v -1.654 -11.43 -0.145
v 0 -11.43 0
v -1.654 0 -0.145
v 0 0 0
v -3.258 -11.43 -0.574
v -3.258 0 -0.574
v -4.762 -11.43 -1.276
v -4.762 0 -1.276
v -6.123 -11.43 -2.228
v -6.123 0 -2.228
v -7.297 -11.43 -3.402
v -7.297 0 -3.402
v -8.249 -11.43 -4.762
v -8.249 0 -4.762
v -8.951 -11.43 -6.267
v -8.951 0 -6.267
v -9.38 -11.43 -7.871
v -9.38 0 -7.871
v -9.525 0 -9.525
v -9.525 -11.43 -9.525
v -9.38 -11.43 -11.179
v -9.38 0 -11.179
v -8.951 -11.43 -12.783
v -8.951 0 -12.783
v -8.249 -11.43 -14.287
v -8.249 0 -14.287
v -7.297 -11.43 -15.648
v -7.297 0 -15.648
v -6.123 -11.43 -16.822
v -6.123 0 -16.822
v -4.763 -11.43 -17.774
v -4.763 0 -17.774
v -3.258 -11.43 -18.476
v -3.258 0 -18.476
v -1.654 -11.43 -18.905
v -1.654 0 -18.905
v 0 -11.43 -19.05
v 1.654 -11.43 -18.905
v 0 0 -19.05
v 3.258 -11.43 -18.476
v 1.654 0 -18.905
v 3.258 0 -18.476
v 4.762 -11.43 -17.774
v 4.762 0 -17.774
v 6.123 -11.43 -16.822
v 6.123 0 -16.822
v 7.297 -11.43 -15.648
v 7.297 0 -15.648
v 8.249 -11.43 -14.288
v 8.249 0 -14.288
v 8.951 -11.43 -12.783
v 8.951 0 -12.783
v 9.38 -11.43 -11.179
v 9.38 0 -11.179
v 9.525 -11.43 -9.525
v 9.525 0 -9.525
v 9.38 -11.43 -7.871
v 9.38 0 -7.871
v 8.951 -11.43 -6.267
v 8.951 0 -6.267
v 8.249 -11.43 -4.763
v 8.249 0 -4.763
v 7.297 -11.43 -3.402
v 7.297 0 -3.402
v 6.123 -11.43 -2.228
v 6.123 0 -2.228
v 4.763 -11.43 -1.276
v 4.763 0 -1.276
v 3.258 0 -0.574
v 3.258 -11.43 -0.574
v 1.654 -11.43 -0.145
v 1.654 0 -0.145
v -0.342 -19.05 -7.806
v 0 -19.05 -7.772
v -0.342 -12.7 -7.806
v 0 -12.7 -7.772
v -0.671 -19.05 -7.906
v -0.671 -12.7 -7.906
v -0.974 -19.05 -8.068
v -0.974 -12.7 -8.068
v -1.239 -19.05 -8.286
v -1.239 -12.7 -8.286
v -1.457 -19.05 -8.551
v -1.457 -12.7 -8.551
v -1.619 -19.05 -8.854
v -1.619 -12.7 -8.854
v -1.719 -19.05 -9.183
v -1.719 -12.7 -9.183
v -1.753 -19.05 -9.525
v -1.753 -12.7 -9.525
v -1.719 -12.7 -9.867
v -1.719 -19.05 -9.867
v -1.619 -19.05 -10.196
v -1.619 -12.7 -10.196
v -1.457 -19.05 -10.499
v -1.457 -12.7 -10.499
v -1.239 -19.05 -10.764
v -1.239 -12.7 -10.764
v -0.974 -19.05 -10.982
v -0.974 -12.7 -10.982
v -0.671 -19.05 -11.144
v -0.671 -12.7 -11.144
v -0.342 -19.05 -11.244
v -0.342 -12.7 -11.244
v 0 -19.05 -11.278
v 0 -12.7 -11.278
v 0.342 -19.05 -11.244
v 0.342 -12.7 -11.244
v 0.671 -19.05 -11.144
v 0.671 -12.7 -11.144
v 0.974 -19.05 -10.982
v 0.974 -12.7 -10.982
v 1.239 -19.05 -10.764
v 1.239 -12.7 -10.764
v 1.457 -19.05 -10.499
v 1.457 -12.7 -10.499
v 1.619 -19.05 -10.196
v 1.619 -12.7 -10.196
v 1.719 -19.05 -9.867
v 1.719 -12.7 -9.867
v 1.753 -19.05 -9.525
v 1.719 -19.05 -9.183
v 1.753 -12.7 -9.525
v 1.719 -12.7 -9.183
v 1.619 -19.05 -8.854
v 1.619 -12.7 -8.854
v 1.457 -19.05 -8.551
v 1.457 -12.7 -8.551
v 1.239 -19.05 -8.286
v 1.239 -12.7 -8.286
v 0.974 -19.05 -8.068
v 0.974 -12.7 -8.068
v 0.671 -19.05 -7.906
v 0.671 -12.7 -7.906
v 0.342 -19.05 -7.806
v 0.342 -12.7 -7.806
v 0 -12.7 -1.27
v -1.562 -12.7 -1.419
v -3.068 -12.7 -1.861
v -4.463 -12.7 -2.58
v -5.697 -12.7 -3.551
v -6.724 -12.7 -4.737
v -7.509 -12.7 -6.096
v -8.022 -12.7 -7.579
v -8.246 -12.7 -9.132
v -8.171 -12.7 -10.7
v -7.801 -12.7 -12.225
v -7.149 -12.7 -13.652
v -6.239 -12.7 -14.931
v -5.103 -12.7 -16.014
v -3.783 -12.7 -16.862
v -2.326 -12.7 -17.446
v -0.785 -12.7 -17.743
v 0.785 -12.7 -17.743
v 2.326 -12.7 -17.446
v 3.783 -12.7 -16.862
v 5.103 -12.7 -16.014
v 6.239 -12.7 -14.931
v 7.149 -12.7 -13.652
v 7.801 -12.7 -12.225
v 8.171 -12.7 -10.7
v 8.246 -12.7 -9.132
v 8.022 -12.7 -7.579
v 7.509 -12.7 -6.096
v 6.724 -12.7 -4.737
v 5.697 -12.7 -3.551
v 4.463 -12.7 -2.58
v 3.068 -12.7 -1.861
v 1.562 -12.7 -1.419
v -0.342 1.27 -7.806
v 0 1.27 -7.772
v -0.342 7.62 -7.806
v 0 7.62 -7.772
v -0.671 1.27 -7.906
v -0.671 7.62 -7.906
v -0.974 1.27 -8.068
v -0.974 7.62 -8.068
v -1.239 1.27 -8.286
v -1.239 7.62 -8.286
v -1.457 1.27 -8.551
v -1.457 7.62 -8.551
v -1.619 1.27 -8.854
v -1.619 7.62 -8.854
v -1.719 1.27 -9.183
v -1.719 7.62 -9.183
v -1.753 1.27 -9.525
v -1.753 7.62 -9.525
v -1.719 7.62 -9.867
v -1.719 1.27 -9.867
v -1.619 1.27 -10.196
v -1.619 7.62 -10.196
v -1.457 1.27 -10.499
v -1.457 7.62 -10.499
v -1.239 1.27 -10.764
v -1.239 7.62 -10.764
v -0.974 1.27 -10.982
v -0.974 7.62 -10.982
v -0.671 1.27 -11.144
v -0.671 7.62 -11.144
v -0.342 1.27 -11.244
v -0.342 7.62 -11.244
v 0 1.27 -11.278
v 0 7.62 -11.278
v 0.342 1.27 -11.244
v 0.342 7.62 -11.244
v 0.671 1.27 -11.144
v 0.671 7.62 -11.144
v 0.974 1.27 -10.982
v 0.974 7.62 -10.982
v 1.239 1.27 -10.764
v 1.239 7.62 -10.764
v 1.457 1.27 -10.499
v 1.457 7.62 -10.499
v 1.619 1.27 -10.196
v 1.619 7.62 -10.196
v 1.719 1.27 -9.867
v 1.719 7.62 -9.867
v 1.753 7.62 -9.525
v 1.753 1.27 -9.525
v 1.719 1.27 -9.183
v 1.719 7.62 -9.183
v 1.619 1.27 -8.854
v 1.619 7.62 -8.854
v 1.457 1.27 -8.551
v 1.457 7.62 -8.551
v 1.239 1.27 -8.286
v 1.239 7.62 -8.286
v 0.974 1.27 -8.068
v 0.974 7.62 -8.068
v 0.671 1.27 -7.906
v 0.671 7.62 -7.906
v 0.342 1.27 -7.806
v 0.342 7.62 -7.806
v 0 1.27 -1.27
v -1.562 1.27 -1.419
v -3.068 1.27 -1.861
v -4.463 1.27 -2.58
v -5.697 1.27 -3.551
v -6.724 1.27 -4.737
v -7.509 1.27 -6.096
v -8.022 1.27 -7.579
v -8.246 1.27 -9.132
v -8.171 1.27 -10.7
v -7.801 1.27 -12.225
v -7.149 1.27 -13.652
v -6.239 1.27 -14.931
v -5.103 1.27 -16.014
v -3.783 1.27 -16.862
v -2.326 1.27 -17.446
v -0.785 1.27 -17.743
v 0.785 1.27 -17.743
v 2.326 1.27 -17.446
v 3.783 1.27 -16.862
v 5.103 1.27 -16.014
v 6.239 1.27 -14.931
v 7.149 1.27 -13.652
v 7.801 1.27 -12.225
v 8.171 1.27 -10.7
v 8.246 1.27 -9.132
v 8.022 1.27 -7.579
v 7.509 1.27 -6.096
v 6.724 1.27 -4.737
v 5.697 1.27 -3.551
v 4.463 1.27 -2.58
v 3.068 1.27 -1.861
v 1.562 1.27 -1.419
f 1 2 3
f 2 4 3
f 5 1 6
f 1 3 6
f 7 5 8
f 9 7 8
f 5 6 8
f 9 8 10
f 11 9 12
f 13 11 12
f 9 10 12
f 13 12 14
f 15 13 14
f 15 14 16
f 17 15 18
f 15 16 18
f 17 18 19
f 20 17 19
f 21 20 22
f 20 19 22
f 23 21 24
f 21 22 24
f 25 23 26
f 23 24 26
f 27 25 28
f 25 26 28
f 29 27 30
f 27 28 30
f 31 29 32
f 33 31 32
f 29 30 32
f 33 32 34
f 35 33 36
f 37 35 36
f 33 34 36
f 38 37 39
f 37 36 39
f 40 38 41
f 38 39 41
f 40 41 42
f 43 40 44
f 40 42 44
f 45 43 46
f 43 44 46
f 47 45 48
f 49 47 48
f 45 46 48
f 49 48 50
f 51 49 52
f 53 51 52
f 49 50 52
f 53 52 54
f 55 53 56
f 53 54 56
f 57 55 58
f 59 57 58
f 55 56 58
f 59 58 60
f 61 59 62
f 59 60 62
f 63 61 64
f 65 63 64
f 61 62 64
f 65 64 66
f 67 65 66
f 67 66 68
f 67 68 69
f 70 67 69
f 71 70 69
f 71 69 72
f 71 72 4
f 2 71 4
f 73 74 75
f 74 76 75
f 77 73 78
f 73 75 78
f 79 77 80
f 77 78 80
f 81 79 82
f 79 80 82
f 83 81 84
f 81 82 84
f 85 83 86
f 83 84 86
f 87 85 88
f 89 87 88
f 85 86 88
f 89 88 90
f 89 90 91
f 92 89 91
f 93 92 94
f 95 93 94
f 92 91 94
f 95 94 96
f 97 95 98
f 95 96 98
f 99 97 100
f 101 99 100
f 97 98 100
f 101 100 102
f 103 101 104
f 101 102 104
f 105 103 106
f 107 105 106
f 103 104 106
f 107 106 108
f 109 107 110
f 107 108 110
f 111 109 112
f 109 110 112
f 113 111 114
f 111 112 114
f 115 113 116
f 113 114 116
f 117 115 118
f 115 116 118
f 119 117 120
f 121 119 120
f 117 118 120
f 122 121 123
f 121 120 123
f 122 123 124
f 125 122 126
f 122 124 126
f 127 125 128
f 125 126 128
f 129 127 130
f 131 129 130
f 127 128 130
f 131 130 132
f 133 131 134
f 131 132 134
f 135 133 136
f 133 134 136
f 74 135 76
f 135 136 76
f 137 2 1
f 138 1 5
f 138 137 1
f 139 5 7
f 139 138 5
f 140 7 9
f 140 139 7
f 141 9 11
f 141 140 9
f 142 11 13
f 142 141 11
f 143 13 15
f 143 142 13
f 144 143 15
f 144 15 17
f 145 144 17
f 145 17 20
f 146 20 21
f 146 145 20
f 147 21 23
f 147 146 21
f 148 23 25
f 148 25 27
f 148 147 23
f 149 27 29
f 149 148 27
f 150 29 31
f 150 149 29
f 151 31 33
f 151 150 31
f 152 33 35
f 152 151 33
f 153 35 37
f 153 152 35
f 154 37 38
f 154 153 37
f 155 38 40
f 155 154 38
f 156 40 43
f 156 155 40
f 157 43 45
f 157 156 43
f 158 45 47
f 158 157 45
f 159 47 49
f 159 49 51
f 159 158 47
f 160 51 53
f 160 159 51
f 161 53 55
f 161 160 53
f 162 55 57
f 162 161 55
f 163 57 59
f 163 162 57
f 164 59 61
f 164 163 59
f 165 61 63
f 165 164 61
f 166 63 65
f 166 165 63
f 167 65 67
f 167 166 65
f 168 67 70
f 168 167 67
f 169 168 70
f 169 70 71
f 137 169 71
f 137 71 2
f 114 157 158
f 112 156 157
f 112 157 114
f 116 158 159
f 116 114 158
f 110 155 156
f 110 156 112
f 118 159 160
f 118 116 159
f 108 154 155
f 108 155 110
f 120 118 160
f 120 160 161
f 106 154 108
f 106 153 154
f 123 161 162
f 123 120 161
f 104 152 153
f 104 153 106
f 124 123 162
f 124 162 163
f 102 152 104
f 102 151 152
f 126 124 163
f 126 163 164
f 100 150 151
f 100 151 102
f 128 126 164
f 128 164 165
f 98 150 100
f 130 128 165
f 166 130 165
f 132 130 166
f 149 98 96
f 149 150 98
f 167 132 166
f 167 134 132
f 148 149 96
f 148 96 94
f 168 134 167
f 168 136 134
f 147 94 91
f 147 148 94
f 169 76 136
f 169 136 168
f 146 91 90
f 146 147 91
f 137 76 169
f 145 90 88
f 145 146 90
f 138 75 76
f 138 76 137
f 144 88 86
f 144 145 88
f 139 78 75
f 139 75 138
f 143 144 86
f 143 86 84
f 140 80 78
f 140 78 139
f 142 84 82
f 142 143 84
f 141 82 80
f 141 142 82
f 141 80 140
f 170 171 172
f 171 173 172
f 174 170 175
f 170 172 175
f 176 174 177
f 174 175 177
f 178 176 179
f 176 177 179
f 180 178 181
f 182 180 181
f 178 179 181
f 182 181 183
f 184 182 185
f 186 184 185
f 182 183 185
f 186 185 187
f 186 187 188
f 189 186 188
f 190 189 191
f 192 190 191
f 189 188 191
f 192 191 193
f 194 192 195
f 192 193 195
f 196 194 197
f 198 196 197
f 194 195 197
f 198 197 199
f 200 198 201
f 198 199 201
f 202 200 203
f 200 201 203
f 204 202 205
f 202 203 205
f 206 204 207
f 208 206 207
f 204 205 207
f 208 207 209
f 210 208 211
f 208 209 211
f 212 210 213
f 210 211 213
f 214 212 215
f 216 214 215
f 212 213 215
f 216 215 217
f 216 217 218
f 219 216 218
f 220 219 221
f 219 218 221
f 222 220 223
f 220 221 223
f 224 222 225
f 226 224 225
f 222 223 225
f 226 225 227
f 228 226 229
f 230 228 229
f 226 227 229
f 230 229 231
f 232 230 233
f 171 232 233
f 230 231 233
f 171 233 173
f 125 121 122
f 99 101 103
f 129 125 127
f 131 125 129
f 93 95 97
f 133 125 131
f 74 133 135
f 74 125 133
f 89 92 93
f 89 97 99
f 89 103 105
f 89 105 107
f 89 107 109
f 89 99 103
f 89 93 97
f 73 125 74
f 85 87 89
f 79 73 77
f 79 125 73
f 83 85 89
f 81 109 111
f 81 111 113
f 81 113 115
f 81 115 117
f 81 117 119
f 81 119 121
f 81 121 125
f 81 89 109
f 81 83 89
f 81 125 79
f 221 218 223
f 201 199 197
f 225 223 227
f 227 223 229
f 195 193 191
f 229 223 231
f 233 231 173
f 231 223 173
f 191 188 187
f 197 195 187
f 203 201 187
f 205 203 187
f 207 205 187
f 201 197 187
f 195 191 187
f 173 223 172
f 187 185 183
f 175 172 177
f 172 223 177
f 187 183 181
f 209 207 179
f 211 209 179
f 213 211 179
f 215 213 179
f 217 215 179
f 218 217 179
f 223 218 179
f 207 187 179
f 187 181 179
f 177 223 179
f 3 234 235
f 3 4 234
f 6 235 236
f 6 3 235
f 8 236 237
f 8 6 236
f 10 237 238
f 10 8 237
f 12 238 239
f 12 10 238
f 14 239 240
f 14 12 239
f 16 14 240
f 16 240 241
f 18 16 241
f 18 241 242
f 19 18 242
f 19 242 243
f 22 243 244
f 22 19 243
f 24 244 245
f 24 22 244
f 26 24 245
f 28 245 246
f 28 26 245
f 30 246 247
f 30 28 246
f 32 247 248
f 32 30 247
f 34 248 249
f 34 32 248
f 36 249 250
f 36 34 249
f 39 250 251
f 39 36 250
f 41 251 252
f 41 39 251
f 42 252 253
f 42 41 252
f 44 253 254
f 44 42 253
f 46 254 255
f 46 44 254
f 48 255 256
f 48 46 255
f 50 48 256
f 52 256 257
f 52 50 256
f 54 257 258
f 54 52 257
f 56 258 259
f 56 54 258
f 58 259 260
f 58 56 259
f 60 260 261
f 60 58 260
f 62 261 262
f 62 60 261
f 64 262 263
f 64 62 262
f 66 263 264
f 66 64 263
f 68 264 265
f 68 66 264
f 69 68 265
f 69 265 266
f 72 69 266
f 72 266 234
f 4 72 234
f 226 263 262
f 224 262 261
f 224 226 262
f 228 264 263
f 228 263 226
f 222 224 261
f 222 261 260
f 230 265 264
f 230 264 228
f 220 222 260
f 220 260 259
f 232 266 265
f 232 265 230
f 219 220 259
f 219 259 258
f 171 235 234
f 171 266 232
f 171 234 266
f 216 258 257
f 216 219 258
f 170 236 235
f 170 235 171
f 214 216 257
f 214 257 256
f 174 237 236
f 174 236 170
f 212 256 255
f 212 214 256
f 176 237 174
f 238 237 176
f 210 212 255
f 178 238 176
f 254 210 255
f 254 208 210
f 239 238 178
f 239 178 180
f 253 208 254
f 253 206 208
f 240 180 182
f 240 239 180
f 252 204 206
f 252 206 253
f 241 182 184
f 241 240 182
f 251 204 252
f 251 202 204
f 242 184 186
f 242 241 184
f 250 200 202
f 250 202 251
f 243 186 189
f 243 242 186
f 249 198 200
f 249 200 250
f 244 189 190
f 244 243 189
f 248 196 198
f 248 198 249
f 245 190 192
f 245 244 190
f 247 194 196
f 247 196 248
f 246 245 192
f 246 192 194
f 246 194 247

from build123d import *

# Parameters (mm, degrees)
SKETCH1_W   = 9.525
SKETCH1_H   = 11.43
SKETCH1_W_2 = 1.7526
SKETCH1_H_2 = 6.35


with BuildPart() as part:
    # Sketch1 → Revolve1 (revolve)
    with BuildSketch(Plane(origin=(0, 0, 0), x_dir=(0, 0, -1), z_dir=(1, 0, 0))):
        with Locations((4.7625, -5.715)):
            Rectangle(SKETCH1_W, SKETCH1_H)
        Polygon((1.27, 1.27), (0, 0), (9.525, 0), (9.525, 1.27), (7.7724, 1.27), align=None)
        with Locations((8.6487, 4.445)):
            Rectangle(SKETCH1_W_2, SKETCH1_H_2)
        Polygon((9.525, -11.43), (0, -11.43), (1.27, -12.7), (7.7724, -12.7), (9.525, -12.7), align=None)
        with Locations((8.6487, -15.875)):
            Rectangle(SKETCH1_W_2, SKETCH1_H_2)
    revolve(axis=Axis((0, 7.62, -9.525), (0, -1, 0)))


solid = part.part
